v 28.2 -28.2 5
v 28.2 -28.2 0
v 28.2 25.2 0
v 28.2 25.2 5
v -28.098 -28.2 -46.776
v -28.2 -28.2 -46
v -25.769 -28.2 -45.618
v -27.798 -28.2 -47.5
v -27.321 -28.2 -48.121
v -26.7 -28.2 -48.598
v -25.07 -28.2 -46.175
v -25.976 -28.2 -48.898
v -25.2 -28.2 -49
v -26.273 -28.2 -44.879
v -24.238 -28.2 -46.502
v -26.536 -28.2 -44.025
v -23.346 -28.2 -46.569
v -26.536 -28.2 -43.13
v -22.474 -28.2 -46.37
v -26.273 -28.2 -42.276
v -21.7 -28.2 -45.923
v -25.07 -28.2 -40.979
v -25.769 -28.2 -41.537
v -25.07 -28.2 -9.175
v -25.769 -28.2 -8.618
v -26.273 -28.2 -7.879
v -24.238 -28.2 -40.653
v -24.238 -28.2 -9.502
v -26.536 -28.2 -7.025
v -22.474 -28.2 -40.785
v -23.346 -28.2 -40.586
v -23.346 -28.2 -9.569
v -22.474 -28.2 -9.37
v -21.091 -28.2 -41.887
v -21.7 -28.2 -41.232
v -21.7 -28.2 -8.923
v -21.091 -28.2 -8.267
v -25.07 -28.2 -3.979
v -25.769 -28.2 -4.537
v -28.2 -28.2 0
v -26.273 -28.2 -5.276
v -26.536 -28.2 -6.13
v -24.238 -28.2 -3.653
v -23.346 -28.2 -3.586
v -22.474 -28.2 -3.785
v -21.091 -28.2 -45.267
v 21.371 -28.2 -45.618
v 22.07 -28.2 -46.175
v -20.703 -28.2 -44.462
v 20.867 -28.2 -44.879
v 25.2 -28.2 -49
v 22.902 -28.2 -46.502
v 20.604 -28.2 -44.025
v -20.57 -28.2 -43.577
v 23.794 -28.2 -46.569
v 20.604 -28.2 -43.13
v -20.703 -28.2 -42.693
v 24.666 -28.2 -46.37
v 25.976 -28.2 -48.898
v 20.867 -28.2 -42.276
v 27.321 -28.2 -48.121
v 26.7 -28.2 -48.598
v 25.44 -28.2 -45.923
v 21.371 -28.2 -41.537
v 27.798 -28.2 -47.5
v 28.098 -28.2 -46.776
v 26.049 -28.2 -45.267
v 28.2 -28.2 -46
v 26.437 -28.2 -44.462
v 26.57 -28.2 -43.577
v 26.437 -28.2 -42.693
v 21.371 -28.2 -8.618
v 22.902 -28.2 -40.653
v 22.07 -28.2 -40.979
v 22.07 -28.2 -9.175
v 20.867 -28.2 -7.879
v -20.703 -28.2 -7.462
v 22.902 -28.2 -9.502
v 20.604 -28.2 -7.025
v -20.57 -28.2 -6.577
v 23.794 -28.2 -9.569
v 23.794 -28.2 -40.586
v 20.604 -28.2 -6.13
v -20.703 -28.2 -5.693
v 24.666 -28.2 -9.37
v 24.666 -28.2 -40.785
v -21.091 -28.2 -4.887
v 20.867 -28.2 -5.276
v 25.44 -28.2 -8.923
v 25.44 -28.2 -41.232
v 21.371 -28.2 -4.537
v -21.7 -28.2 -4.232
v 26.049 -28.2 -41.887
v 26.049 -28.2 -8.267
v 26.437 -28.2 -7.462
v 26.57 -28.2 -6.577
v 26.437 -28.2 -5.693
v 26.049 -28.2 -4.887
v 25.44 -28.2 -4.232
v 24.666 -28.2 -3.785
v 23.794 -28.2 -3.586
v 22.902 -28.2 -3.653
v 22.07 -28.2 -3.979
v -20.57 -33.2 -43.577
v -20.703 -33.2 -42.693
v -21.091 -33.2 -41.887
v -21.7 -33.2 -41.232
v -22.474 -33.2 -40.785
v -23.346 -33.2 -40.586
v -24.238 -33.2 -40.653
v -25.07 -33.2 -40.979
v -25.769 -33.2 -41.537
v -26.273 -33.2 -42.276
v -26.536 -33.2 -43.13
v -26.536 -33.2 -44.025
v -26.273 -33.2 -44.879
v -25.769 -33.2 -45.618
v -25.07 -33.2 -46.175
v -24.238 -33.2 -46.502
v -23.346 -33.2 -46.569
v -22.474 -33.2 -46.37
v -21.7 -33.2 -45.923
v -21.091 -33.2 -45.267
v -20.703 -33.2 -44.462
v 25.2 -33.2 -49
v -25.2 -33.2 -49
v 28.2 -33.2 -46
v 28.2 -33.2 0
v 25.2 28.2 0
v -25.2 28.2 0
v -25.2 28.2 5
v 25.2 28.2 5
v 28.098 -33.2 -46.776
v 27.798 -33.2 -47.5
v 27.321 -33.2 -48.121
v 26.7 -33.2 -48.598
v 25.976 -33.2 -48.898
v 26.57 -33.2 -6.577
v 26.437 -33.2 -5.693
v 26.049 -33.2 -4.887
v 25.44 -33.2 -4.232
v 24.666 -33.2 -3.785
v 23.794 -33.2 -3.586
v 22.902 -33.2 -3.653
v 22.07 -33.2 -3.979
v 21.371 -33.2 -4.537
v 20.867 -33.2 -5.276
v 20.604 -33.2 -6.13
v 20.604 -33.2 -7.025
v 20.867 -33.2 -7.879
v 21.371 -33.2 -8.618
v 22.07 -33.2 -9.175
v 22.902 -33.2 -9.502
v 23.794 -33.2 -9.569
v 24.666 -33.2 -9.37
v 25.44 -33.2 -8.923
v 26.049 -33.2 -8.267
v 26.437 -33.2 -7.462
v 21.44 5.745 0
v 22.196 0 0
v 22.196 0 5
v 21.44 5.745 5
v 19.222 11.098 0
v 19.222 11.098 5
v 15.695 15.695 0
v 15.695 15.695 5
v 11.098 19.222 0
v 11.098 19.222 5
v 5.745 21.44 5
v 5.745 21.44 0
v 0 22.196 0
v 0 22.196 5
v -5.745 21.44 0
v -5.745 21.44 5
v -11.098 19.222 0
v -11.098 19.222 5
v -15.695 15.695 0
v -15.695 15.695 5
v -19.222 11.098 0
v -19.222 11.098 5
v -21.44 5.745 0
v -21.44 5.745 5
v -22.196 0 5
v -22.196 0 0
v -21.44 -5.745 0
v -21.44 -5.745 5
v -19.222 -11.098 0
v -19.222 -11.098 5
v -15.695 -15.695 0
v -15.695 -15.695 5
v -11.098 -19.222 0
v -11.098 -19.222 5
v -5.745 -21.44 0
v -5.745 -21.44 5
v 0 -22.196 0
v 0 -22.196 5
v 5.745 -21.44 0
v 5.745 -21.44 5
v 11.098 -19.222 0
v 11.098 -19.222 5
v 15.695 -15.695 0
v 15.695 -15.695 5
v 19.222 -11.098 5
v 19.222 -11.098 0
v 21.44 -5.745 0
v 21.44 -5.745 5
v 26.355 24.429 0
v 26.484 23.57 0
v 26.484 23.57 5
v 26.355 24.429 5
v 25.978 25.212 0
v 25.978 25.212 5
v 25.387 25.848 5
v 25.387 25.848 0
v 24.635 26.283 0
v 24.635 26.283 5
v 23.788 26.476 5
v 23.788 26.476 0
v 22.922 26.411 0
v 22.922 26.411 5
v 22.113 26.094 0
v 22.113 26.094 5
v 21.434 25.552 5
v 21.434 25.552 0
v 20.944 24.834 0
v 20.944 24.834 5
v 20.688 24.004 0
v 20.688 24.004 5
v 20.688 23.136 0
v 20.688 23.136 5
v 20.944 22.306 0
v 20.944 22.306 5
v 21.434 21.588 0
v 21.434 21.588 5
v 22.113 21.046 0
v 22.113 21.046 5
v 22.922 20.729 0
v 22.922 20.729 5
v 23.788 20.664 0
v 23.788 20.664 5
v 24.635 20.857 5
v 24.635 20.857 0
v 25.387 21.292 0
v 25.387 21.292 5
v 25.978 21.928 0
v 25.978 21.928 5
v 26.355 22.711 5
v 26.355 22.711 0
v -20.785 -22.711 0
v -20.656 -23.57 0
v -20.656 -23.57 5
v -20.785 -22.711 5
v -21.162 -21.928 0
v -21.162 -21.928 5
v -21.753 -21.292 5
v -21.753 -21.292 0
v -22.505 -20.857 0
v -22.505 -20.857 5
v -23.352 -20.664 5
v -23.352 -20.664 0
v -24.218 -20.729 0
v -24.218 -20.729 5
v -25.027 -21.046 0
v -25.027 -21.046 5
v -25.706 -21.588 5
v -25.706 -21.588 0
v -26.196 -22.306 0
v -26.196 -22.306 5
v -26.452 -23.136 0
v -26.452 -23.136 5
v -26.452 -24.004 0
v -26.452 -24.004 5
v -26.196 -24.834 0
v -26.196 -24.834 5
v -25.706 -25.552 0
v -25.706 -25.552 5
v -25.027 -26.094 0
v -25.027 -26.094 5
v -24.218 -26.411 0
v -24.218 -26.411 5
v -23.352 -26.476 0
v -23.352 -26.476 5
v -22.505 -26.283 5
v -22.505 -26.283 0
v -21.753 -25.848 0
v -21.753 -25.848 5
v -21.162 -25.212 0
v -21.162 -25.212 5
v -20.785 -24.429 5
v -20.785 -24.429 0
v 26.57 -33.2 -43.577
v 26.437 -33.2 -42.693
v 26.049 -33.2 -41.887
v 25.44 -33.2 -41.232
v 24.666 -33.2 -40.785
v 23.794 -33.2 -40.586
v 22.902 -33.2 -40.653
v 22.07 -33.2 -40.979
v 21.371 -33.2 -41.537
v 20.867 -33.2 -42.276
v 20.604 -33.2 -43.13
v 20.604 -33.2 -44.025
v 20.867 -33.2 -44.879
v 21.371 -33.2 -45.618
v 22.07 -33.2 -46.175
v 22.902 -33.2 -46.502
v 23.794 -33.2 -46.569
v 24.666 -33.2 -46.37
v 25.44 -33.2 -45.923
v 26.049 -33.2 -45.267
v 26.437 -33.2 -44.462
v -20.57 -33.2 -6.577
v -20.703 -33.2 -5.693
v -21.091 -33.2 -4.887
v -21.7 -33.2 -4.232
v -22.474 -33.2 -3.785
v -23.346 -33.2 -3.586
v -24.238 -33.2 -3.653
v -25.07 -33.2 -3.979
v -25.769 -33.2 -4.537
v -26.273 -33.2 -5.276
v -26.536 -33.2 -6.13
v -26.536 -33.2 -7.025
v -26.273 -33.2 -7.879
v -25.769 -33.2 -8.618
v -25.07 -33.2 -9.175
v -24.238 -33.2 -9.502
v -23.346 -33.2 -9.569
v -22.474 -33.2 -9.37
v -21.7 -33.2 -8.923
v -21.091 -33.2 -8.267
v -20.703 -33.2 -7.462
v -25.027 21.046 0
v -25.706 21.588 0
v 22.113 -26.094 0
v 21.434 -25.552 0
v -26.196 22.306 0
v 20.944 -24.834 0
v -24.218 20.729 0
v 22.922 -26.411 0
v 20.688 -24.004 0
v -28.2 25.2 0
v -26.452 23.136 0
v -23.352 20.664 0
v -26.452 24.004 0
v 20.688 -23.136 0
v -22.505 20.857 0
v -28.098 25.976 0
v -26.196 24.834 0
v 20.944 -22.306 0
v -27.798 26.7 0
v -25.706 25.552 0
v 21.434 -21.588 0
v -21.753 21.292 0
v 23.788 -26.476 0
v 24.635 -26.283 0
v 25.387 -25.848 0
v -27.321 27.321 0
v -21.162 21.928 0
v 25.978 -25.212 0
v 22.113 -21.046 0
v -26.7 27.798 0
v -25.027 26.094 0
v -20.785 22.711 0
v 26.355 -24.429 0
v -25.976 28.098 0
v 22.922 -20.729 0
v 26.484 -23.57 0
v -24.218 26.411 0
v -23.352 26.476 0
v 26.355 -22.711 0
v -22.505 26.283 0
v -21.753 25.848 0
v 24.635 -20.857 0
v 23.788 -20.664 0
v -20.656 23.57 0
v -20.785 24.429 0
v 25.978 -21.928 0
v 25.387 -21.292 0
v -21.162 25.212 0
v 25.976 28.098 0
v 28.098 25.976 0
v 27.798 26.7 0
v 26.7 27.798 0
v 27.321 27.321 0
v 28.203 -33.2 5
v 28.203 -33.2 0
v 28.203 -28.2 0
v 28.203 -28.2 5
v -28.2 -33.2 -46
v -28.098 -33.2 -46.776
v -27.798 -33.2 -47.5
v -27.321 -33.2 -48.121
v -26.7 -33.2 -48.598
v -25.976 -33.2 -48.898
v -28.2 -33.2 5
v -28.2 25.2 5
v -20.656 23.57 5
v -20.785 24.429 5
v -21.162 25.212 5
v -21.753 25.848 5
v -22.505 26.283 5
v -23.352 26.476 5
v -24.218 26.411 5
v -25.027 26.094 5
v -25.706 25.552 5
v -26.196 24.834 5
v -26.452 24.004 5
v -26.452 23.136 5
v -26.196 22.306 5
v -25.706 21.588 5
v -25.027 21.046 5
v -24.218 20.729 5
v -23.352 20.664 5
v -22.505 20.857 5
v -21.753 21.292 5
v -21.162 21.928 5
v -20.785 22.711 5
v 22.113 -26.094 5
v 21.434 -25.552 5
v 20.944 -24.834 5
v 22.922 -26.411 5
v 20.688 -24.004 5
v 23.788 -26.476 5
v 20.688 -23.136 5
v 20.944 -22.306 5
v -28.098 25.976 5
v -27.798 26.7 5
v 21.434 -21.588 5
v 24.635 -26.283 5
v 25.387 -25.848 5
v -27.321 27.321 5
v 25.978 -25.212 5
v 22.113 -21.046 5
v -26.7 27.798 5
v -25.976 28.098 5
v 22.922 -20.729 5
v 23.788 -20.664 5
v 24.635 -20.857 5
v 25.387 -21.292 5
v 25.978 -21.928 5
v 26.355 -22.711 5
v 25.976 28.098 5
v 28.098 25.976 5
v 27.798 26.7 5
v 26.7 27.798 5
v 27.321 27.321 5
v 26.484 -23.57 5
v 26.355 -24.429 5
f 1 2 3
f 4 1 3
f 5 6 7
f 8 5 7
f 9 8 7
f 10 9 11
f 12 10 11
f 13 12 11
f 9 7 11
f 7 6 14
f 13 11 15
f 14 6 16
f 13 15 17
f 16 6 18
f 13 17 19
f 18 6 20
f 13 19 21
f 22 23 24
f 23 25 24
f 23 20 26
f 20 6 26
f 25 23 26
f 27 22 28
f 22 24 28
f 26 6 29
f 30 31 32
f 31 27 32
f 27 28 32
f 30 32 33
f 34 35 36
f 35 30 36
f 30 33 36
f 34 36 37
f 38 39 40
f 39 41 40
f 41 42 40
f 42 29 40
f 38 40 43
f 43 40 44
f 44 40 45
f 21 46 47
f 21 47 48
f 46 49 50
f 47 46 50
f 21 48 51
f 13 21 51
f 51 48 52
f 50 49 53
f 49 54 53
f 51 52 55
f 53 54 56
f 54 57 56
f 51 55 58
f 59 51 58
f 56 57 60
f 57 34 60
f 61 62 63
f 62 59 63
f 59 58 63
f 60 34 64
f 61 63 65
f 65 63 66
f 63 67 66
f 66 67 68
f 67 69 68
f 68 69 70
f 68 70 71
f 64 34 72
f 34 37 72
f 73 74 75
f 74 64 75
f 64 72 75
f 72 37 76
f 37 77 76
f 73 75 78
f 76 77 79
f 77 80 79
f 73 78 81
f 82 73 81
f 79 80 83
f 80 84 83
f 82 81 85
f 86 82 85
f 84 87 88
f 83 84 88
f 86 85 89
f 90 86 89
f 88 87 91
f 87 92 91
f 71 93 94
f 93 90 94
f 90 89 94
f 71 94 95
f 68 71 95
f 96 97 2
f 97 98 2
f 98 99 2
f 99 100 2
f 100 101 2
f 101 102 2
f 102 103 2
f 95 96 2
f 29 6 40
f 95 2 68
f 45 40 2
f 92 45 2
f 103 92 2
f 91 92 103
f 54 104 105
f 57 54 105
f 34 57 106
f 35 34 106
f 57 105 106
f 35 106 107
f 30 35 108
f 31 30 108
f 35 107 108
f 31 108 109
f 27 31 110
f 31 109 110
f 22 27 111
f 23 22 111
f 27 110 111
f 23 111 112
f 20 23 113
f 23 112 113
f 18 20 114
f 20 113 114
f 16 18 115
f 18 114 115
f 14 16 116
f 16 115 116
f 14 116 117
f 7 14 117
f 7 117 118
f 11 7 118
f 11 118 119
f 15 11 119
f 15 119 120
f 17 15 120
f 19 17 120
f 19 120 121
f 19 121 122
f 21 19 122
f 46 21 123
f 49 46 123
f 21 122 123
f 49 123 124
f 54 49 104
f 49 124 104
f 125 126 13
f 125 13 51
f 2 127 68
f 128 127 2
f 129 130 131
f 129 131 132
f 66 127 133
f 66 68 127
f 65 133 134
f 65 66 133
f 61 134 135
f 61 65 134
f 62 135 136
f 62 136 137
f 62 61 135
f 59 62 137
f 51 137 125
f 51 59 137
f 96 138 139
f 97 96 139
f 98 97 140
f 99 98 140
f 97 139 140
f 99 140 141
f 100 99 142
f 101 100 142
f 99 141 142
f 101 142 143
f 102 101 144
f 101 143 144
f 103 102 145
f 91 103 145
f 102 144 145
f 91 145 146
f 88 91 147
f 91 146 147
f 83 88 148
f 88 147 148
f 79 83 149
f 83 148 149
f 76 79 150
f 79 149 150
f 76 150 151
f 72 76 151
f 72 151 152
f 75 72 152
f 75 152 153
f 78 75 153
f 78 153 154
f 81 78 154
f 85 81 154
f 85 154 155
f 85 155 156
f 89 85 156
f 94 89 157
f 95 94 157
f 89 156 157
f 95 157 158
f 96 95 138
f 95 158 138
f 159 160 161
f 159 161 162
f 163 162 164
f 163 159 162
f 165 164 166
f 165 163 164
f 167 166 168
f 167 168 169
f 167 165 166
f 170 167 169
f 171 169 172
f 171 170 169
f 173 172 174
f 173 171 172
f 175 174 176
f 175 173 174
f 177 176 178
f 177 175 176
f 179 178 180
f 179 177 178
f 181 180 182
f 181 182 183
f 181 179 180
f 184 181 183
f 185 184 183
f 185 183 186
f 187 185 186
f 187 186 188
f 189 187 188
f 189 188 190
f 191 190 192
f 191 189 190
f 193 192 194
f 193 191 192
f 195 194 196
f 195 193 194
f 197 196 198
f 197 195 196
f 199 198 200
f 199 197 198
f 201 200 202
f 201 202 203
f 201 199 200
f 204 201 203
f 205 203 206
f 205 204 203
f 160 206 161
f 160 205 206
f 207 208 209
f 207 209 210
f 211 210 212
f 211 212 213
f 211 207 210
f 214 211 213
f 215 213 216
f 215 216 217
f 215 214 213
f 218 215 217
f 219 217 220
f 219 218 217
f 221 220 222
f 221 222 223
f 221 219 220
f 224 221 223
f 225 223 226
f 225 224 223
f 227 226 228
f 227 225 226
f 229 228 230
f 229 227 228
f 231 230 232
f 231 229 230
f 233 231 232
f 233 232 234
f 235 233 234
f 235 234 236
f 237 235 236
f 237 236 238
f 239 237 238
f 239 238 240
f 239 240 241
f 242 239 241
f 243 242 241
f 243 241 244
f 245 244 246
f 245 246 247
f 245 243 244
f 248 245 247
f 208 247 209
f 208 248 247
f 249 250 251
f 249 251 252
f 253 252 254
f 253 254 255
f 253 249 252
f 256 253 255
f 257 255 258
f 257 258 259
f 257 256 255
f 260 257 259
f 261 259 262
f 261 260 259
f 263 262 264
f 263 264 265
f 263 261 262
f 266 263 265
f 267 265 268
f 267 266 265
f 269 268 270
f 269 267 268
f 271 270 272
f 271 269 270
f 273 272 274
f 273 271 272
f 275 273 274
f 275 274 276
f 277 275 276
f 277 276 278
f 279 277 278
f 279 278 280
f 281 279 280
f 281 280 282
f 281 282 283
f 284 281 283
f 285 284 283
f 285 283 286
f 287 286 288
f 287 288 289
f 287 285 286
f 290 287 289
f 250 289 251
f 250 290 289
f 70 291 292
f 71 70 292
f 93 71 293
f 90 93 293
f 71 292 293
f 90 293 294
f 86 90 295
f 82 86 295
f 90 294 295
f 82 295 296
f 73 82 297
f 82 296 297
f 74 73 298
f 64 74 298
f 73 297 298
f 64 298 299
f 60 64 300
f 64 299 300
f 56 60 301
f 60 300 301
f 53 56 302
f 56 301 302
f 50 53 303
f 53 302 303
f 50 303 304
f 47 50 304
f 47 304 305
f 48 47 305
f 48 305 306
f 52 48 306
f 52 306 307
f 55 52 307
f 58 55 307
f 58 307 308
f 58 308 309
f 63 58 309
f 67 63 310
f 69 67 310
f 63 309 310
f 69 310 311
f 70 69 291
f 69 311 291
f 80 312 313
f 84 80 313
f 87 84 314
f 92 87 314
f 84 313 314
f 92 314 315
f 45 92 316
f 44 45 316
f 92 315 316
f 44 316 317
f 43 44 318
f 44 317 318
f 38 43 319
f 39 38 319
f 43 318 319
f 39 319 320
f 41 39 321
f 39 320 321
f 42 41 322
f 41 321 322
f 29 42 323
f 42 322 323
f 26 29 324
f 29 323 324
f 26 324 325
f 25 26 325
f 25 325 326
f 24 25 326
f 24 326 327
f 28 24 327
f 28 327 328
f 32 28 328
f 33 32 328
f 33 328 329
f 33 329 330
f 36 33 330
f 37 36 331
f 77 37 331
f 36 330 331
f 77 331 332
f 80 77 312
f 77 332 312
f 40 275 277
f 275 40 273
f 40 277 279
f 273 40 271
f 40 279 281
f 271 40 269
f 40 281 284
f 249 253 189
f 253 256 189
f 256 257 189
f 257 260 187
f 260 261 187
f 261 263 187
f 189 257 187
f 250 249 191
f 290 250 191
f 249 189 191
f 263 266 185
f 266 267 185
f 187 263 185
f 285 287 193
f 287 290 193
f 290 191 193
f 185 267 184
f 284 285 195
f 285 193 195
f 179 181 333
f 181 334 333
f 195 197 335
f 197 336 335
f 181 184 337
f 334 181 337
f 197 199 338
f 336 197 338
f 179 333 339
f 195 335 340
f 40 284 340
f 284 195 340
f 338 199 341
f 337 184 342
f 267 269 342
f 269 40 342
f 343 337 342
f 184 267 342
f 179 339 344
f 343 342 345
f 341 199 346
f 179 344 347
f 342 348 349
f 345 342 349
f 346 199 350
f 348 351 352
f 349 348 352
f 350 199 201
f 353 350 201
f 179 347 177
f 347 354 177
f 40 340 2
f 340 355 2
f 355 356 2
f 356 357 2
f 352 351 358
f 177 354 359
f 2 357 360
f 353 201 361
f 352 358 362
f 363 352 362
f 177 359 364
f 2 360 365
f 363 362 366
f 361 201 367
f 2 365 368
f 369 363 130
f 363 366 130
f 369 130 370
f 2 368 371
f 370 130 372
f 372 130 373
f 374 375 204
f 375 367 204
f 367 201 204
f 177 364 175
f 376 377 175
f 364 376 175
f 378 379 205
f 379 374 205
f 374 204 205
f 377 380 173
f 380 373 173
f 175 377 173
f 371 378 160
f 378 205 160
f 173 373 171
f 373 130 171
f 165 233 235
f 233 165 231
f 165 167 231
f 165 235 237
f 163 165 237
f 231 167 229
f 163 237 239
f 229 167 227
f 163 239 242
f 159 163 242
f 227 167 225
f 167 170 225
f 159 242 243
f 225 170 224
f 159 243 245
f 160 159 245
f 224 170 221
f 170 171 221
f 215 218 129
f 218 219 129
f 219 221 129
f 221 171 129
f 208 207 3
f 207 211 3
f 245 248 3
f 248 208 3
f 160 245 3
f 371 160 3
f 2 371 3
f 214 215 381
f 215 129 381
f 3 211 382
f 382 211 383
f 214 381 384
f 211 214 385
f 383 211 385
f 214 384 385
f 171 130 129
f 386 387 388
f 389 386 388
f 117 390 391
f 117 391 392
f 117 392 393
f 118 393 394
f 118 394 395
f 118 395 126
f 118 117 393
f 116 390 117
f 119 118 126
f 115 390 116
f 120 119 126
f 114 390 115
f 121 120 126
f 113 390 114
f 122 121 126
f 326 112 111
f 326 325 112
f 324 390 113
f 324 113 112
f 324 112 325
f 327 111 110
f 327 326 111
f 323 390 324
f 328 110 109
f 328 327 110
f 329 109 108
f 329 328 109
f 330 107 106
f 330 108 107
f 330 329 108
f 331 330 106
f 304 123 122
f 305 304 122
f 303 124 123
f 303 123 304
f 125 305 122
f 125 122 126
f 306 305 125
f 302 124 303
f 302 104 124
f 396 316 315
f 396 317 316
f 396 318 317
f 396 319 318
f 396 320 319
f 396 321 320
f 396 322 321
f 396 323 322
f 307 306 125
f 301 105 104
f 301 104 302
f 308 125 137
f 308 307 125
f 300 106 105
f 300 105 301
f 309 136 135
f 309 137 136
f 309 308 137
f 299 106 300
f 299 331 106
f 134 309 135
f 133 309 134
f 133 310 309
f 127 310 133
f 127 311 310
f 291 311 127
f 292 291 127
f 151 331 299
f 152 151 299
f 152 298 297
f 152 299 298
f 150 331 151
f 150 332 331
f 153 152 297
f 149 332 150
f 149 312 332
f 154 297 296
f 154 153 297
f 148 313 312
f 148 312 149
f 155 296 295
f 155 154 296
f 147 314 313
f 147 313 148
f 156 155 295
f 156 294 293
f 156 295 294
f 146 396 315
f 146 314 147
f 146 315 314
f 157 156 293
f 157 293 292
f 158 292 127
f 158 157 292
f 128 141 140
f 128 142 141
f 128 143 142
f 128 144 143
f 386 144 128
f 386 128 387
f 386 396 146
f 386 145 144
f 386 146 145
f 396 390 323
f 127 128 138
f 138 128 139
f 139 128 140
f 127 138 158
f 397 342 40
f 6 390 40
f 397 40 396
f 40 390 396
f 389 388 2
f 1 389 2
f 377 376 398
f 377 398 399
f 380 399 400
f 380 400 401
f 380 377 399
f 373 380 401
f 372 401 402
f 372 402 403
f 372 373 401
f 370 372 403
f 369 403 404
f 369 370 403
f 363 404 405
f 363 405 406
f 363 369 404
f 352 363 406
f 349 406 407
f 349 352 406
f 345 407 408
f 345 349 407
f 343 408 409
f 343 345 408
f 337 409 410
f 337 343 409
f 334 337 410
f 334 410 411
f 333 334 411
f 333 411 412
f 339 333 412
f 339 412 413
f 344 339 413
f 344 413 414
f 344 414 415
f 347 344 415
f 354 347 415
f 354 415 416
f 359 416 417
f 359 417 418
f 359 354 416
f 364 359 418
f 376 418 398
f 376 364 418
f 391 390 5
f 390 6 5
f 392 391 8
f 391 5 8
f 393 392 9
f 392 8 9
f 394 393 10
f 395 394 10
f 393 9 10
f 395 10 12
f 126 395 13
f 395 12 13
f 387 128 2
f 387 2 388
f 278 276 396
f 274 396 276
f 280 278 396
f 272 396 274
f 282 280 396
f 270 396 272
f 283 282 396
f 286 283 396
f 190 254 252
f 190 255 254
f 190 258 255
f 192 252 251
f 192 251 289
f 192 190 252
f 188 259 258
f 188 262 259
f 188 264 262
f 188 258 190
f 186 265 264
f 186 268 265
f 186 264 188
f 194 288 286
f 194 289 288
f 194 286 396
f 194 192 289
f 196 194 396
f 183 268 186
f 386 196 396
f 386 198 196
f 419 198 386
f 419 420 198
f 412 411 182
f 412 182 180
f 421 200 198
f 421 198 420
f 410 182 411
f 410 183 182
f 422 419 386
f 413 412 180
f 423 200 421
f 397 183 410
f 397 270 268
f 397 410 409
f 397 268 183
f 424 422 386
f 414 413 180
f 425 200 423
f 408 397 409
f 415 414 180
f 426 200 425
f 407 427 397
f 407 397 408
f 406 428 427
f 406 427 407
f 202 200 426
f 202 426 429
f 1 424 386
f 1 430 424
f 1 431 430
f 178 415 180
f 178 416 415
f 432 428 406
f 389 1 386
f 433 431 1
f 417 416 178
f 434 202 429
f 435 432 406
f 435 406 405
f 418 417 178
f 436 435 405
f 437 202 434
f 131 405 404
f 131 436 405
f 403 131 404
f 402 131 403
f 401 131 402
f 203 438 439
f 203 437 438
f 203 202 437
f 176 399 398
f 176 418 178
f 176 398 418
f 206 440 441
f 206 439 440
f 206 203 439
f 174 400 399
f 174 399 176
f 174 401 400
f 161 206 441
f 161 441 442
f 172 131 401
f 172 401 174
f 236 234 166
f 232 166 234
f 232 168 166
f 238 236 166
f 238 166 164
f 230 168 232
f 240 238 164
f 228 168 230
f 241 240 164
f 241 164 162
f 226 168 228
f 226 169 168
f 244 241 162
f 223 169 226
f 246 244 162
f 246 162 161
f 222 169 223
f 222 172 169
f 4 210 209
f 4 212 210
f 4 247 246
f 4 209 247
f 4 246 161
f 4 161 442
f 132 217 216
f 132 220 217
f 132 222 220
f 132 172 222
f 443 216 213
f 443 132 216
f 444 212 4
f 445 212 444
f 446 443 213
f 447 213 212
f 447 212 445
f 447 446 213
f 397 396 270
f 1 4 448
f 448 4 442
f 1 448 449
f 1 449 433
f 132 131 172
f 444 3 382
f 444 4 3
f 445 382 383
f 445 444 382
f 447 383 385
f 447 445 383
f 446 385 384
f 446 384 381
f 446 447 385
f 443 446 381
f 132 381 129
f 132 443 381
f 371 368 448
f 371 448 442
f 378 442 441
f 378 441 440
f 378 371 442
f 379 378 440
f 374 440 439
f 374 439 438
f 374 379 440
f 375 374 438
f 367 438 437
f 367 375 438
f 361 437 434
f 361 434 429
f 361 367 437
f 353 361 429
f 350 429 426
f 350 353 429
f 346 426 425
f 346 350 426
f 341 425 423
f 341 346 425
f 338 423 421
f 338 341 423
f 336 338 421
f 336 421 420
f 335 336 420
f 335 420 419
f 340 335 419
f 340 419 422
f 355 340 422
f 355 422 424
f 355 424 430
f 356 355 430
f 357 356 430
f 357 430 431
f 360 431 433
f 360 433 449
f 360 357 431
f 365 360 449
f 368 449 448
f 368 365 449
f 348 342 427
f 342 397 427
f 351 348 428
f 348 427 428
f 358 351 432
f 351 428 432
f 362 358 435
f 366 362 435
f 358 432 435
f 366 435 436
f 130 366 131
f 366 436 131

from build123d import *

# Parameters (mm, degrees)
F0_W     = 56.4
F0_H     = 56.4
F0_R     = 2.914102
F0_R_2   = 22.195946
F1_DEPTH = 5
F2_W     = 56.4
F2_H     = 49
F2_R     = 3
F3_DEPTH = 5
F4_R     = 3


with BuildPart() as f1:
    # F0 (on Top) → F1 (new body)
    with BuildSketch(Plane.XY):
        Rectangle(F0_W, F0_H)
        with Locations((-23.57, -23.57)):
            Circle(F0_R, mode=Mode.SUBTRACT)
        with Locations((23.57, -23.57)):
            Circle(F0_R, mode=Mode.SUBTRACT)
        Circle(F0_R_2, mode=Mode.SUBTRACT)
        with Locations((-23.57, 23.57)):
            Circle(F0_R, mode=Mode.SUBTRACT)
        with Locations((23.57, 23.57)):
            Circle(F0_R, mode=Mode.SUBTRACT)
        Polygon((28.203152, -28.2), (28.2, -28.2), (-28.2, -28.2), (-28.2, -33.2), (28.203152, -33.2), align=None)
    extrude(amount=F1_DEPTH)

    # F2 (on face) → F3 (join)
    with BuildSketch(Plane.XZ.offset(33.2)):
        with Locations((0, -24.5)):
            Rectangle(F2_W, F2_H)
        with Locations((-23.57, -43.577386)):
            Circle(F2_R, mode=Mode.SUBTRACT)
        with Locations((23.57, -43.577386)):
            Circle(F2_R, mode=Mode.SUBTRACT)
        with Locations((-23.57, -6.577386)):
            Circle(F2_R, mode=Mode.SUBTRACT)
        with Locations((23.57, -6.577386)):
            Circle(F2_R, mode=Mode.SUBTRACT)
    extrude(amount=-F3_DEPTH)

    # F4
    f4_edges = [f1.edges().sort_by_distance(p)[0] for p in [
        (-28.2, 28.2, 2.5),
        (28.2, 28.2, 2.5),
        (-28.2, -30.7, -49),
        (28.2, -30.7, -49),
    ]]
    fillet(f4_edges, radius=F4_R)


solid = f1.part
